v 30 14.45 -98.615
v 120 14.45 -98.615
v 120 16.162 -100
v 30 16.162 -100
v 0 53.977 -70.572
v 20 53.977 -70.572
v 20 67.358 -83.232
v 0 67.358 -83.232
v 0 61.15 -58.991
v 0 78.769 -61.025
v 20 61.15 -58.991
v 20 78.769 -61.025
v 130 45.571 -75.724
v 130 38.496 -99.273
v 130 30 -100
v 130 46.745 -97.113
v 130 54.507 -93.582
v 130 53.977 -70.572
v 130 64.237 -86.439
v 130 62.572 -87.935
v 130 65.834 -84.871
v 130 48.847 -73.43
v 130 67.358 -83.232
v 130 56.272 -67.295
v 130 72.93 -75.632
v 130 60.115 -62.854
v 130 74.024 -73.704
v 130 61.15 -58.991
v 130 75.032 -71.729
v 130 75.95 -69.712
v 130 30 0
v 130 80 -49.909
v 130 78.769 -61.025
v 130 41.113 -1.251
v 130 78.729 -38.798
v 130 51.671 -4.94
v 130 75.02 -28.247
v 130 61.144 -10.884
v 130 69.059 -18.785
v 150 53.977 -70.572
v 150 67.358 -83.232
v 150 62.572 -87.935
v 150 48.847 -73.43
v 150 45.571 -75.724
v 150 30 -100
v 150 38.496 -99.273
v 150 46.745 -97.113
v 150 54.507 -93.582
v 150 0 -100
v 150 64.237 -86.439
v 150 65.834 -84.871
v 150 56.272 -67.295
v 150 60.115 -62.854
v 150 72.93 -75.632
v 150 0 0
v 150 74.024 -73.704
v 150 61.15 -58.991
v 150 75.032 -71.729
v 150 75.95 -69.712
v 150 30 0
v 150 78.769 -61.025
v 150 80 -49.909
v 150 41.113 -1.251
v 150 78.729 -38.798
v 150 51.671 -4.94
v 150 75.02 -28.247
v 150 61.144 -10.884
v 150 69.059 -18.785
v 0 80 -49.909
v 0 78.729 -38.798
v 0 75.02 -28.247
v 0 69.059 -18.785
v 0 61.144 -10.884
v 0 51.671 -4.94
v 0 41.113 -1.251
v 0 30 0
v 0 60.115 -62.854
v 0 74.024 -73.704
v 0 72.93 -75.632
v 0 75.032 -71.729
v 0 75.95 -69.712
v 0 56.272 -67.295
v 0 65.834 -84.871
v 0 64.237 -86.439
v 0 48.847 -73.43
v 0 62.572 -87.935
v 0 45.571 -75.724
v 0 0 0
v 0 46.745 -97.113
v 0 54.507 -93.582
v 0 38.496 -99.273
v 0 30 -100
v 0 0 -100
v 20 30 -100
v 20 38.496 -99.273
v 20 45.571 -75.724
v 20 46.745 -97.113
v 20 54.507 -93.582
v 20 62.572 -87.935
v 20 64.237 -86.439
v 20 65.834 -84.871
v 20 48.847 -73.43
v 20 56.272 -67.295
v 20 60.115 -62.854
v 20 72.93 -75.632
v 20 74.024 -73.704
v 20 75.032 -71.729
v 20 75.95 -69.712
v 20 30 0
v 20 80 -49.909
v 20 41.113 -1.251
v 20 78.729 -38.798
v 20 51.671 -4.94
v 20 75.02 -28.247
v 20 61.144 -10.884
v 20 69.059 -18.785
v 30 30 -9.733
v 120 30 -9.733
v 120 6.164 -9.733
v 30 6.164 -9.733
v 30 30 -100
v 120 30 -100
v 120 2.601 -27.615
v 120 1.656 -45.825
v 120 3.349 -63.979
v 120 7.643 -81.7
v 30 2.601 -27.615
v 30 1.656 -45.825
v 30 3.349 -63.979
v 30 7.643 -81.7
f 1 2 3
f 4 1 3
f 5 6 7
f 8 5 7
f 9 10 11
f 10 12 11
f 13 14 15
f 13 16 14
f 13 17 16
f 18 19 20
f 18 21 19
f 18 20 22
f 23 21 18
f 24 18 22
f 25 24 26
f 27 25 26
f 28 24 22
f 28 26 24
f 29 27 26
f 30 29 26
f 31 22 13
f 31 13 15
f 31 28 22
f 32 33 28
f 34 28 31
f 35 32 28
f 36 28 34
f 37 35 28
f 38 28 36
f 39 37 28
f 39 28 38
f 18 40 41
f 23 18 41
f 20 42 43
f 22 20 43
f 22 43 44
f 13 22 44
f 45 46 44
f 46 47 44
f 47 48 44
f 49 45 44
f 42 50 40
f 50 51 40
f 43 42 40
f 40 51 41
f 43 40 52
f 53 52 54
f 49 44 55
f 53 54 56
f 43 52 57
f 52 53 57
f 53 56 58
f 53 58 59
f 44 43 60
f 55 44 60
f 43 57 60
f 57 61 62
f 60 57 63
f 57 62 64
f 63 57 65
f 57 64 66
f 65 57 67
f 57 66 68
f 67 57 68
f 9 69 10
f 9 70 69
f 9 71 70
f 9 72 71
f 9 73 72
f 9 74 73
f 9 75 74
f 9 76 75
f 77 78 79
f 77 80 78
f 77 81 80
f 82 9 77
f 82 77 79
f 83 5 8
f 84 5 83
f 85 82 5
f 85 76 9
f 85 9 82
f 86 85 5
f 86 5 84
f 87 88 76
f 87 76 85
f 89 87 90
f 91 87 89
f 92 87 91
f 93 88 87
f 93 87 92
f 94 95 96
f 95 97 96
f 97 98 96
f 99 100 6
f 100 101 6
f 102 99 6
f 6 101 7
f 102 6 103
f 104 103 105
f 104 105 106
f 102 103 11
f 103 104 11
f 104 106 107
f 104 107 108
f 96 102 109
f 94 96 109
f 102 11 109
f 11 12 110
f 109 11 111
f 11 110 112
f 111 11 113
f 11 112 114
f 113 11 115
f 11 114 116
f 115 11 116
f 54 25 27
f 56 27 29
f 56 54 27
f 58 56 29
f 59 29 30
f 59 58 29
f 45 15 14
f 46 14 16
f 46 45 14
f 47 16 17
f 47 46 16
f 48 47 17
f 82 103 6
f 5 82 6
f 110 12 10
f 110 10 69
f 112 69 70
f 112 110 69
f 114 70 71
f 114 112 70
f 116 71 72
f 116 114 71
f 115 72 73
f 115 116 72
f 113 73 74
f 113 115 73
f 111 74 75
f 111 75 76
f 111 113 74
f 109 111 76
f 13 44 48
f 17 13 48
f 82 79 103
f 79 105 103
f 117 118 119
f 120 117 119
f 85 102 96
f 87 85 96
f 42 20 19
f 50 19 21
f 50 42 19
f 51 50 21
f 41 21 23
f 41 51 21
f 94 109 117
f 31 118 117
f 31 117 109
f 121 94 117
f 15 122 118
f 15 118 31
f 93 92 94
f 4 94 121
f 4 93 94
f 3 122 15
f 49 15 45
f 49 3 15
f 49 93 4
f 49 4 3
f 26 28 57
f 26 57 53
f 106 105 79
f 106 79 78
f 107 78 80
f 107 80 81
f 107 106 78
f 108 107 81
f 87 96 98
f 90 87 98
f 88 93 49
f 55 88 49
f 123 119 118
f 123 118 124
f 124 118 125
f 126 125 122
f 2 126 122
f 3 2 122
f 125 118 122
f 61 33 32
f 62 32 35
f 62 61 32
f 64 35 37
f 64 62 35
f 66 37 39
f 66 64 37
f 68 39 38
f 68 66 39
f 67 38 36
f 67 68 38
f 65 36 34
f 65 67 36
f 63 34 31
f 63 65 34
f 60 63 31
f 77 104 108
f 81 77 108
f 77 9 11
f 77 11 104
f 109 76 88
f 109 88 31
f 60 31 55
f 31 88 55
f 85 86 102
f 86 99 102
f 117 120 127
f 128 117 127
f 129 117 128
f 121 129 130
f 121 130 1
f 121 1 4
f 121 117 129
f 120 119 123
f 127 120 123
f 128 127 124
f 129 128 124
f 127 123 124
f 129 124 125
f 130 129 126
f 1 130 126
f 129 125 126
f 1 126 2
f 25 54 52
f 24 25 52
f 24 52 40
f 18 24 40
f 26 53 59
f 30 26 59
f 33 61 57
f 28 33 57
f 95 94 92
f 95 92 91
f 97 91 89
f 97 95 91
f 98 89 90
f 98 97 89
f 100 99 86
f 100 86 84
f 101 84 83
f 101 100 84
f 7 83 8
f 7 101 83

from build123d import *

# Parameters (mm, degrees)
SKETCH1_W           = 150
SKETCH1_H           = 100
BOSS_EXTRUDE1_DEPTH = 30
SKETCH3_W           = 20
SKETCH3_H           = 50
REVOLVE1_ANGLE      = 180
CUT_EXTRUDE2_DEPTH  = 198.230829233
CIRPATTERN1_COUNT   = 3
CIRPATTERN1_ANGLE   = 40
CUT_EXTRUDE3_START  = -30
CUT_EXTRUDE3_DEPTH  = 90


with BuildPart() as part:
    # Sketch1 → Boss-Extrude1 (new body)
    with BuildSketch(Plane(origin=(0, 0, 0), x_dir=(1, 0, 0), z_dir=(0, 1, 0))):
        with Locations((75, 50)):
            Rectangle(SKETCH1_W, SKETCH1_H)
    extrude(amount=BOSS_EXTRUDE1_DEPTH)

    # Sketch3 → Revolve1 (revolve)
    with BuildSketch(Plane(origin=(0, 30, 0), x_dir=(1, 0, 0), z_dir=(0, 1, 0))):
        with Locations((140, 75)):
            Rectangle(SKETCH3_W, SKETCH3_H)
        with Locations((10, 75)):
            Rectangle(SKETCH3_W, SKETCH3_H)
    revolve(axis=Axis((150, 30, -50), (1, 0, 0)), revolution_arc=REVOLVE1_ANGLE)

    # Sketch4 → Cut-Extrude2 (cut, through all)
    with BuildSketch(Plane(origin=(150, 0, 0), x_dir=(0, 0, -1), z_dir=(1, 0, 0))):
        Polygon((94.056786042, 54.745020752), (88.321021678, 62.936541195), (73.429921107, 48.847356556), (75.724226853, 45.570748379), align=None)
    cut_extrude2 = extrude(amount=-CUT_EXTRUDE2_DEPTH, mode=Mode.SUBTRACT)

    # CirPattern1: Cut-Extrude2 ×3 about axis
    cirpattern1_axis = Axis((0, 35.163146629, -49.309446005), (1, 0, 0))
    for i in range(1, CIRPATTERN1_COUNT):
        add(cut_extrude2.rotate(cirpattern1_axis, i * CIRPATTERN1_ANGLE / (CIRPATTERN1_COUNT - 1)), mode=Mode.SUBTRACT)

    # Sketch8 → Cut-Extrude3 (cut)
    with BuildSketch(Plane(origin=(150, 0, 0), x_dir=(0, 0, -1), z_dir=(1, 0, 0)).offset(CUT_EXTRUDE3_START)):
        with BuildLine():
            Line((111.193302221, 30), (9.733387686, 30))
            Line((9.733387686, 30), (9.733387686, 6.163594969))
            ThreePointArc((9.733387686, 6.163594969), (54.932592736, 2.173437288), (98.615148428, 14.450400418))
            Line((98.615148428, 14.450400418), (111.193302221, 30))
        make_face()
    extrude(amount=-CUT_EXTRUDE3_DEPTH, mode=Mode.SUBTRACT)


solid = part.part
